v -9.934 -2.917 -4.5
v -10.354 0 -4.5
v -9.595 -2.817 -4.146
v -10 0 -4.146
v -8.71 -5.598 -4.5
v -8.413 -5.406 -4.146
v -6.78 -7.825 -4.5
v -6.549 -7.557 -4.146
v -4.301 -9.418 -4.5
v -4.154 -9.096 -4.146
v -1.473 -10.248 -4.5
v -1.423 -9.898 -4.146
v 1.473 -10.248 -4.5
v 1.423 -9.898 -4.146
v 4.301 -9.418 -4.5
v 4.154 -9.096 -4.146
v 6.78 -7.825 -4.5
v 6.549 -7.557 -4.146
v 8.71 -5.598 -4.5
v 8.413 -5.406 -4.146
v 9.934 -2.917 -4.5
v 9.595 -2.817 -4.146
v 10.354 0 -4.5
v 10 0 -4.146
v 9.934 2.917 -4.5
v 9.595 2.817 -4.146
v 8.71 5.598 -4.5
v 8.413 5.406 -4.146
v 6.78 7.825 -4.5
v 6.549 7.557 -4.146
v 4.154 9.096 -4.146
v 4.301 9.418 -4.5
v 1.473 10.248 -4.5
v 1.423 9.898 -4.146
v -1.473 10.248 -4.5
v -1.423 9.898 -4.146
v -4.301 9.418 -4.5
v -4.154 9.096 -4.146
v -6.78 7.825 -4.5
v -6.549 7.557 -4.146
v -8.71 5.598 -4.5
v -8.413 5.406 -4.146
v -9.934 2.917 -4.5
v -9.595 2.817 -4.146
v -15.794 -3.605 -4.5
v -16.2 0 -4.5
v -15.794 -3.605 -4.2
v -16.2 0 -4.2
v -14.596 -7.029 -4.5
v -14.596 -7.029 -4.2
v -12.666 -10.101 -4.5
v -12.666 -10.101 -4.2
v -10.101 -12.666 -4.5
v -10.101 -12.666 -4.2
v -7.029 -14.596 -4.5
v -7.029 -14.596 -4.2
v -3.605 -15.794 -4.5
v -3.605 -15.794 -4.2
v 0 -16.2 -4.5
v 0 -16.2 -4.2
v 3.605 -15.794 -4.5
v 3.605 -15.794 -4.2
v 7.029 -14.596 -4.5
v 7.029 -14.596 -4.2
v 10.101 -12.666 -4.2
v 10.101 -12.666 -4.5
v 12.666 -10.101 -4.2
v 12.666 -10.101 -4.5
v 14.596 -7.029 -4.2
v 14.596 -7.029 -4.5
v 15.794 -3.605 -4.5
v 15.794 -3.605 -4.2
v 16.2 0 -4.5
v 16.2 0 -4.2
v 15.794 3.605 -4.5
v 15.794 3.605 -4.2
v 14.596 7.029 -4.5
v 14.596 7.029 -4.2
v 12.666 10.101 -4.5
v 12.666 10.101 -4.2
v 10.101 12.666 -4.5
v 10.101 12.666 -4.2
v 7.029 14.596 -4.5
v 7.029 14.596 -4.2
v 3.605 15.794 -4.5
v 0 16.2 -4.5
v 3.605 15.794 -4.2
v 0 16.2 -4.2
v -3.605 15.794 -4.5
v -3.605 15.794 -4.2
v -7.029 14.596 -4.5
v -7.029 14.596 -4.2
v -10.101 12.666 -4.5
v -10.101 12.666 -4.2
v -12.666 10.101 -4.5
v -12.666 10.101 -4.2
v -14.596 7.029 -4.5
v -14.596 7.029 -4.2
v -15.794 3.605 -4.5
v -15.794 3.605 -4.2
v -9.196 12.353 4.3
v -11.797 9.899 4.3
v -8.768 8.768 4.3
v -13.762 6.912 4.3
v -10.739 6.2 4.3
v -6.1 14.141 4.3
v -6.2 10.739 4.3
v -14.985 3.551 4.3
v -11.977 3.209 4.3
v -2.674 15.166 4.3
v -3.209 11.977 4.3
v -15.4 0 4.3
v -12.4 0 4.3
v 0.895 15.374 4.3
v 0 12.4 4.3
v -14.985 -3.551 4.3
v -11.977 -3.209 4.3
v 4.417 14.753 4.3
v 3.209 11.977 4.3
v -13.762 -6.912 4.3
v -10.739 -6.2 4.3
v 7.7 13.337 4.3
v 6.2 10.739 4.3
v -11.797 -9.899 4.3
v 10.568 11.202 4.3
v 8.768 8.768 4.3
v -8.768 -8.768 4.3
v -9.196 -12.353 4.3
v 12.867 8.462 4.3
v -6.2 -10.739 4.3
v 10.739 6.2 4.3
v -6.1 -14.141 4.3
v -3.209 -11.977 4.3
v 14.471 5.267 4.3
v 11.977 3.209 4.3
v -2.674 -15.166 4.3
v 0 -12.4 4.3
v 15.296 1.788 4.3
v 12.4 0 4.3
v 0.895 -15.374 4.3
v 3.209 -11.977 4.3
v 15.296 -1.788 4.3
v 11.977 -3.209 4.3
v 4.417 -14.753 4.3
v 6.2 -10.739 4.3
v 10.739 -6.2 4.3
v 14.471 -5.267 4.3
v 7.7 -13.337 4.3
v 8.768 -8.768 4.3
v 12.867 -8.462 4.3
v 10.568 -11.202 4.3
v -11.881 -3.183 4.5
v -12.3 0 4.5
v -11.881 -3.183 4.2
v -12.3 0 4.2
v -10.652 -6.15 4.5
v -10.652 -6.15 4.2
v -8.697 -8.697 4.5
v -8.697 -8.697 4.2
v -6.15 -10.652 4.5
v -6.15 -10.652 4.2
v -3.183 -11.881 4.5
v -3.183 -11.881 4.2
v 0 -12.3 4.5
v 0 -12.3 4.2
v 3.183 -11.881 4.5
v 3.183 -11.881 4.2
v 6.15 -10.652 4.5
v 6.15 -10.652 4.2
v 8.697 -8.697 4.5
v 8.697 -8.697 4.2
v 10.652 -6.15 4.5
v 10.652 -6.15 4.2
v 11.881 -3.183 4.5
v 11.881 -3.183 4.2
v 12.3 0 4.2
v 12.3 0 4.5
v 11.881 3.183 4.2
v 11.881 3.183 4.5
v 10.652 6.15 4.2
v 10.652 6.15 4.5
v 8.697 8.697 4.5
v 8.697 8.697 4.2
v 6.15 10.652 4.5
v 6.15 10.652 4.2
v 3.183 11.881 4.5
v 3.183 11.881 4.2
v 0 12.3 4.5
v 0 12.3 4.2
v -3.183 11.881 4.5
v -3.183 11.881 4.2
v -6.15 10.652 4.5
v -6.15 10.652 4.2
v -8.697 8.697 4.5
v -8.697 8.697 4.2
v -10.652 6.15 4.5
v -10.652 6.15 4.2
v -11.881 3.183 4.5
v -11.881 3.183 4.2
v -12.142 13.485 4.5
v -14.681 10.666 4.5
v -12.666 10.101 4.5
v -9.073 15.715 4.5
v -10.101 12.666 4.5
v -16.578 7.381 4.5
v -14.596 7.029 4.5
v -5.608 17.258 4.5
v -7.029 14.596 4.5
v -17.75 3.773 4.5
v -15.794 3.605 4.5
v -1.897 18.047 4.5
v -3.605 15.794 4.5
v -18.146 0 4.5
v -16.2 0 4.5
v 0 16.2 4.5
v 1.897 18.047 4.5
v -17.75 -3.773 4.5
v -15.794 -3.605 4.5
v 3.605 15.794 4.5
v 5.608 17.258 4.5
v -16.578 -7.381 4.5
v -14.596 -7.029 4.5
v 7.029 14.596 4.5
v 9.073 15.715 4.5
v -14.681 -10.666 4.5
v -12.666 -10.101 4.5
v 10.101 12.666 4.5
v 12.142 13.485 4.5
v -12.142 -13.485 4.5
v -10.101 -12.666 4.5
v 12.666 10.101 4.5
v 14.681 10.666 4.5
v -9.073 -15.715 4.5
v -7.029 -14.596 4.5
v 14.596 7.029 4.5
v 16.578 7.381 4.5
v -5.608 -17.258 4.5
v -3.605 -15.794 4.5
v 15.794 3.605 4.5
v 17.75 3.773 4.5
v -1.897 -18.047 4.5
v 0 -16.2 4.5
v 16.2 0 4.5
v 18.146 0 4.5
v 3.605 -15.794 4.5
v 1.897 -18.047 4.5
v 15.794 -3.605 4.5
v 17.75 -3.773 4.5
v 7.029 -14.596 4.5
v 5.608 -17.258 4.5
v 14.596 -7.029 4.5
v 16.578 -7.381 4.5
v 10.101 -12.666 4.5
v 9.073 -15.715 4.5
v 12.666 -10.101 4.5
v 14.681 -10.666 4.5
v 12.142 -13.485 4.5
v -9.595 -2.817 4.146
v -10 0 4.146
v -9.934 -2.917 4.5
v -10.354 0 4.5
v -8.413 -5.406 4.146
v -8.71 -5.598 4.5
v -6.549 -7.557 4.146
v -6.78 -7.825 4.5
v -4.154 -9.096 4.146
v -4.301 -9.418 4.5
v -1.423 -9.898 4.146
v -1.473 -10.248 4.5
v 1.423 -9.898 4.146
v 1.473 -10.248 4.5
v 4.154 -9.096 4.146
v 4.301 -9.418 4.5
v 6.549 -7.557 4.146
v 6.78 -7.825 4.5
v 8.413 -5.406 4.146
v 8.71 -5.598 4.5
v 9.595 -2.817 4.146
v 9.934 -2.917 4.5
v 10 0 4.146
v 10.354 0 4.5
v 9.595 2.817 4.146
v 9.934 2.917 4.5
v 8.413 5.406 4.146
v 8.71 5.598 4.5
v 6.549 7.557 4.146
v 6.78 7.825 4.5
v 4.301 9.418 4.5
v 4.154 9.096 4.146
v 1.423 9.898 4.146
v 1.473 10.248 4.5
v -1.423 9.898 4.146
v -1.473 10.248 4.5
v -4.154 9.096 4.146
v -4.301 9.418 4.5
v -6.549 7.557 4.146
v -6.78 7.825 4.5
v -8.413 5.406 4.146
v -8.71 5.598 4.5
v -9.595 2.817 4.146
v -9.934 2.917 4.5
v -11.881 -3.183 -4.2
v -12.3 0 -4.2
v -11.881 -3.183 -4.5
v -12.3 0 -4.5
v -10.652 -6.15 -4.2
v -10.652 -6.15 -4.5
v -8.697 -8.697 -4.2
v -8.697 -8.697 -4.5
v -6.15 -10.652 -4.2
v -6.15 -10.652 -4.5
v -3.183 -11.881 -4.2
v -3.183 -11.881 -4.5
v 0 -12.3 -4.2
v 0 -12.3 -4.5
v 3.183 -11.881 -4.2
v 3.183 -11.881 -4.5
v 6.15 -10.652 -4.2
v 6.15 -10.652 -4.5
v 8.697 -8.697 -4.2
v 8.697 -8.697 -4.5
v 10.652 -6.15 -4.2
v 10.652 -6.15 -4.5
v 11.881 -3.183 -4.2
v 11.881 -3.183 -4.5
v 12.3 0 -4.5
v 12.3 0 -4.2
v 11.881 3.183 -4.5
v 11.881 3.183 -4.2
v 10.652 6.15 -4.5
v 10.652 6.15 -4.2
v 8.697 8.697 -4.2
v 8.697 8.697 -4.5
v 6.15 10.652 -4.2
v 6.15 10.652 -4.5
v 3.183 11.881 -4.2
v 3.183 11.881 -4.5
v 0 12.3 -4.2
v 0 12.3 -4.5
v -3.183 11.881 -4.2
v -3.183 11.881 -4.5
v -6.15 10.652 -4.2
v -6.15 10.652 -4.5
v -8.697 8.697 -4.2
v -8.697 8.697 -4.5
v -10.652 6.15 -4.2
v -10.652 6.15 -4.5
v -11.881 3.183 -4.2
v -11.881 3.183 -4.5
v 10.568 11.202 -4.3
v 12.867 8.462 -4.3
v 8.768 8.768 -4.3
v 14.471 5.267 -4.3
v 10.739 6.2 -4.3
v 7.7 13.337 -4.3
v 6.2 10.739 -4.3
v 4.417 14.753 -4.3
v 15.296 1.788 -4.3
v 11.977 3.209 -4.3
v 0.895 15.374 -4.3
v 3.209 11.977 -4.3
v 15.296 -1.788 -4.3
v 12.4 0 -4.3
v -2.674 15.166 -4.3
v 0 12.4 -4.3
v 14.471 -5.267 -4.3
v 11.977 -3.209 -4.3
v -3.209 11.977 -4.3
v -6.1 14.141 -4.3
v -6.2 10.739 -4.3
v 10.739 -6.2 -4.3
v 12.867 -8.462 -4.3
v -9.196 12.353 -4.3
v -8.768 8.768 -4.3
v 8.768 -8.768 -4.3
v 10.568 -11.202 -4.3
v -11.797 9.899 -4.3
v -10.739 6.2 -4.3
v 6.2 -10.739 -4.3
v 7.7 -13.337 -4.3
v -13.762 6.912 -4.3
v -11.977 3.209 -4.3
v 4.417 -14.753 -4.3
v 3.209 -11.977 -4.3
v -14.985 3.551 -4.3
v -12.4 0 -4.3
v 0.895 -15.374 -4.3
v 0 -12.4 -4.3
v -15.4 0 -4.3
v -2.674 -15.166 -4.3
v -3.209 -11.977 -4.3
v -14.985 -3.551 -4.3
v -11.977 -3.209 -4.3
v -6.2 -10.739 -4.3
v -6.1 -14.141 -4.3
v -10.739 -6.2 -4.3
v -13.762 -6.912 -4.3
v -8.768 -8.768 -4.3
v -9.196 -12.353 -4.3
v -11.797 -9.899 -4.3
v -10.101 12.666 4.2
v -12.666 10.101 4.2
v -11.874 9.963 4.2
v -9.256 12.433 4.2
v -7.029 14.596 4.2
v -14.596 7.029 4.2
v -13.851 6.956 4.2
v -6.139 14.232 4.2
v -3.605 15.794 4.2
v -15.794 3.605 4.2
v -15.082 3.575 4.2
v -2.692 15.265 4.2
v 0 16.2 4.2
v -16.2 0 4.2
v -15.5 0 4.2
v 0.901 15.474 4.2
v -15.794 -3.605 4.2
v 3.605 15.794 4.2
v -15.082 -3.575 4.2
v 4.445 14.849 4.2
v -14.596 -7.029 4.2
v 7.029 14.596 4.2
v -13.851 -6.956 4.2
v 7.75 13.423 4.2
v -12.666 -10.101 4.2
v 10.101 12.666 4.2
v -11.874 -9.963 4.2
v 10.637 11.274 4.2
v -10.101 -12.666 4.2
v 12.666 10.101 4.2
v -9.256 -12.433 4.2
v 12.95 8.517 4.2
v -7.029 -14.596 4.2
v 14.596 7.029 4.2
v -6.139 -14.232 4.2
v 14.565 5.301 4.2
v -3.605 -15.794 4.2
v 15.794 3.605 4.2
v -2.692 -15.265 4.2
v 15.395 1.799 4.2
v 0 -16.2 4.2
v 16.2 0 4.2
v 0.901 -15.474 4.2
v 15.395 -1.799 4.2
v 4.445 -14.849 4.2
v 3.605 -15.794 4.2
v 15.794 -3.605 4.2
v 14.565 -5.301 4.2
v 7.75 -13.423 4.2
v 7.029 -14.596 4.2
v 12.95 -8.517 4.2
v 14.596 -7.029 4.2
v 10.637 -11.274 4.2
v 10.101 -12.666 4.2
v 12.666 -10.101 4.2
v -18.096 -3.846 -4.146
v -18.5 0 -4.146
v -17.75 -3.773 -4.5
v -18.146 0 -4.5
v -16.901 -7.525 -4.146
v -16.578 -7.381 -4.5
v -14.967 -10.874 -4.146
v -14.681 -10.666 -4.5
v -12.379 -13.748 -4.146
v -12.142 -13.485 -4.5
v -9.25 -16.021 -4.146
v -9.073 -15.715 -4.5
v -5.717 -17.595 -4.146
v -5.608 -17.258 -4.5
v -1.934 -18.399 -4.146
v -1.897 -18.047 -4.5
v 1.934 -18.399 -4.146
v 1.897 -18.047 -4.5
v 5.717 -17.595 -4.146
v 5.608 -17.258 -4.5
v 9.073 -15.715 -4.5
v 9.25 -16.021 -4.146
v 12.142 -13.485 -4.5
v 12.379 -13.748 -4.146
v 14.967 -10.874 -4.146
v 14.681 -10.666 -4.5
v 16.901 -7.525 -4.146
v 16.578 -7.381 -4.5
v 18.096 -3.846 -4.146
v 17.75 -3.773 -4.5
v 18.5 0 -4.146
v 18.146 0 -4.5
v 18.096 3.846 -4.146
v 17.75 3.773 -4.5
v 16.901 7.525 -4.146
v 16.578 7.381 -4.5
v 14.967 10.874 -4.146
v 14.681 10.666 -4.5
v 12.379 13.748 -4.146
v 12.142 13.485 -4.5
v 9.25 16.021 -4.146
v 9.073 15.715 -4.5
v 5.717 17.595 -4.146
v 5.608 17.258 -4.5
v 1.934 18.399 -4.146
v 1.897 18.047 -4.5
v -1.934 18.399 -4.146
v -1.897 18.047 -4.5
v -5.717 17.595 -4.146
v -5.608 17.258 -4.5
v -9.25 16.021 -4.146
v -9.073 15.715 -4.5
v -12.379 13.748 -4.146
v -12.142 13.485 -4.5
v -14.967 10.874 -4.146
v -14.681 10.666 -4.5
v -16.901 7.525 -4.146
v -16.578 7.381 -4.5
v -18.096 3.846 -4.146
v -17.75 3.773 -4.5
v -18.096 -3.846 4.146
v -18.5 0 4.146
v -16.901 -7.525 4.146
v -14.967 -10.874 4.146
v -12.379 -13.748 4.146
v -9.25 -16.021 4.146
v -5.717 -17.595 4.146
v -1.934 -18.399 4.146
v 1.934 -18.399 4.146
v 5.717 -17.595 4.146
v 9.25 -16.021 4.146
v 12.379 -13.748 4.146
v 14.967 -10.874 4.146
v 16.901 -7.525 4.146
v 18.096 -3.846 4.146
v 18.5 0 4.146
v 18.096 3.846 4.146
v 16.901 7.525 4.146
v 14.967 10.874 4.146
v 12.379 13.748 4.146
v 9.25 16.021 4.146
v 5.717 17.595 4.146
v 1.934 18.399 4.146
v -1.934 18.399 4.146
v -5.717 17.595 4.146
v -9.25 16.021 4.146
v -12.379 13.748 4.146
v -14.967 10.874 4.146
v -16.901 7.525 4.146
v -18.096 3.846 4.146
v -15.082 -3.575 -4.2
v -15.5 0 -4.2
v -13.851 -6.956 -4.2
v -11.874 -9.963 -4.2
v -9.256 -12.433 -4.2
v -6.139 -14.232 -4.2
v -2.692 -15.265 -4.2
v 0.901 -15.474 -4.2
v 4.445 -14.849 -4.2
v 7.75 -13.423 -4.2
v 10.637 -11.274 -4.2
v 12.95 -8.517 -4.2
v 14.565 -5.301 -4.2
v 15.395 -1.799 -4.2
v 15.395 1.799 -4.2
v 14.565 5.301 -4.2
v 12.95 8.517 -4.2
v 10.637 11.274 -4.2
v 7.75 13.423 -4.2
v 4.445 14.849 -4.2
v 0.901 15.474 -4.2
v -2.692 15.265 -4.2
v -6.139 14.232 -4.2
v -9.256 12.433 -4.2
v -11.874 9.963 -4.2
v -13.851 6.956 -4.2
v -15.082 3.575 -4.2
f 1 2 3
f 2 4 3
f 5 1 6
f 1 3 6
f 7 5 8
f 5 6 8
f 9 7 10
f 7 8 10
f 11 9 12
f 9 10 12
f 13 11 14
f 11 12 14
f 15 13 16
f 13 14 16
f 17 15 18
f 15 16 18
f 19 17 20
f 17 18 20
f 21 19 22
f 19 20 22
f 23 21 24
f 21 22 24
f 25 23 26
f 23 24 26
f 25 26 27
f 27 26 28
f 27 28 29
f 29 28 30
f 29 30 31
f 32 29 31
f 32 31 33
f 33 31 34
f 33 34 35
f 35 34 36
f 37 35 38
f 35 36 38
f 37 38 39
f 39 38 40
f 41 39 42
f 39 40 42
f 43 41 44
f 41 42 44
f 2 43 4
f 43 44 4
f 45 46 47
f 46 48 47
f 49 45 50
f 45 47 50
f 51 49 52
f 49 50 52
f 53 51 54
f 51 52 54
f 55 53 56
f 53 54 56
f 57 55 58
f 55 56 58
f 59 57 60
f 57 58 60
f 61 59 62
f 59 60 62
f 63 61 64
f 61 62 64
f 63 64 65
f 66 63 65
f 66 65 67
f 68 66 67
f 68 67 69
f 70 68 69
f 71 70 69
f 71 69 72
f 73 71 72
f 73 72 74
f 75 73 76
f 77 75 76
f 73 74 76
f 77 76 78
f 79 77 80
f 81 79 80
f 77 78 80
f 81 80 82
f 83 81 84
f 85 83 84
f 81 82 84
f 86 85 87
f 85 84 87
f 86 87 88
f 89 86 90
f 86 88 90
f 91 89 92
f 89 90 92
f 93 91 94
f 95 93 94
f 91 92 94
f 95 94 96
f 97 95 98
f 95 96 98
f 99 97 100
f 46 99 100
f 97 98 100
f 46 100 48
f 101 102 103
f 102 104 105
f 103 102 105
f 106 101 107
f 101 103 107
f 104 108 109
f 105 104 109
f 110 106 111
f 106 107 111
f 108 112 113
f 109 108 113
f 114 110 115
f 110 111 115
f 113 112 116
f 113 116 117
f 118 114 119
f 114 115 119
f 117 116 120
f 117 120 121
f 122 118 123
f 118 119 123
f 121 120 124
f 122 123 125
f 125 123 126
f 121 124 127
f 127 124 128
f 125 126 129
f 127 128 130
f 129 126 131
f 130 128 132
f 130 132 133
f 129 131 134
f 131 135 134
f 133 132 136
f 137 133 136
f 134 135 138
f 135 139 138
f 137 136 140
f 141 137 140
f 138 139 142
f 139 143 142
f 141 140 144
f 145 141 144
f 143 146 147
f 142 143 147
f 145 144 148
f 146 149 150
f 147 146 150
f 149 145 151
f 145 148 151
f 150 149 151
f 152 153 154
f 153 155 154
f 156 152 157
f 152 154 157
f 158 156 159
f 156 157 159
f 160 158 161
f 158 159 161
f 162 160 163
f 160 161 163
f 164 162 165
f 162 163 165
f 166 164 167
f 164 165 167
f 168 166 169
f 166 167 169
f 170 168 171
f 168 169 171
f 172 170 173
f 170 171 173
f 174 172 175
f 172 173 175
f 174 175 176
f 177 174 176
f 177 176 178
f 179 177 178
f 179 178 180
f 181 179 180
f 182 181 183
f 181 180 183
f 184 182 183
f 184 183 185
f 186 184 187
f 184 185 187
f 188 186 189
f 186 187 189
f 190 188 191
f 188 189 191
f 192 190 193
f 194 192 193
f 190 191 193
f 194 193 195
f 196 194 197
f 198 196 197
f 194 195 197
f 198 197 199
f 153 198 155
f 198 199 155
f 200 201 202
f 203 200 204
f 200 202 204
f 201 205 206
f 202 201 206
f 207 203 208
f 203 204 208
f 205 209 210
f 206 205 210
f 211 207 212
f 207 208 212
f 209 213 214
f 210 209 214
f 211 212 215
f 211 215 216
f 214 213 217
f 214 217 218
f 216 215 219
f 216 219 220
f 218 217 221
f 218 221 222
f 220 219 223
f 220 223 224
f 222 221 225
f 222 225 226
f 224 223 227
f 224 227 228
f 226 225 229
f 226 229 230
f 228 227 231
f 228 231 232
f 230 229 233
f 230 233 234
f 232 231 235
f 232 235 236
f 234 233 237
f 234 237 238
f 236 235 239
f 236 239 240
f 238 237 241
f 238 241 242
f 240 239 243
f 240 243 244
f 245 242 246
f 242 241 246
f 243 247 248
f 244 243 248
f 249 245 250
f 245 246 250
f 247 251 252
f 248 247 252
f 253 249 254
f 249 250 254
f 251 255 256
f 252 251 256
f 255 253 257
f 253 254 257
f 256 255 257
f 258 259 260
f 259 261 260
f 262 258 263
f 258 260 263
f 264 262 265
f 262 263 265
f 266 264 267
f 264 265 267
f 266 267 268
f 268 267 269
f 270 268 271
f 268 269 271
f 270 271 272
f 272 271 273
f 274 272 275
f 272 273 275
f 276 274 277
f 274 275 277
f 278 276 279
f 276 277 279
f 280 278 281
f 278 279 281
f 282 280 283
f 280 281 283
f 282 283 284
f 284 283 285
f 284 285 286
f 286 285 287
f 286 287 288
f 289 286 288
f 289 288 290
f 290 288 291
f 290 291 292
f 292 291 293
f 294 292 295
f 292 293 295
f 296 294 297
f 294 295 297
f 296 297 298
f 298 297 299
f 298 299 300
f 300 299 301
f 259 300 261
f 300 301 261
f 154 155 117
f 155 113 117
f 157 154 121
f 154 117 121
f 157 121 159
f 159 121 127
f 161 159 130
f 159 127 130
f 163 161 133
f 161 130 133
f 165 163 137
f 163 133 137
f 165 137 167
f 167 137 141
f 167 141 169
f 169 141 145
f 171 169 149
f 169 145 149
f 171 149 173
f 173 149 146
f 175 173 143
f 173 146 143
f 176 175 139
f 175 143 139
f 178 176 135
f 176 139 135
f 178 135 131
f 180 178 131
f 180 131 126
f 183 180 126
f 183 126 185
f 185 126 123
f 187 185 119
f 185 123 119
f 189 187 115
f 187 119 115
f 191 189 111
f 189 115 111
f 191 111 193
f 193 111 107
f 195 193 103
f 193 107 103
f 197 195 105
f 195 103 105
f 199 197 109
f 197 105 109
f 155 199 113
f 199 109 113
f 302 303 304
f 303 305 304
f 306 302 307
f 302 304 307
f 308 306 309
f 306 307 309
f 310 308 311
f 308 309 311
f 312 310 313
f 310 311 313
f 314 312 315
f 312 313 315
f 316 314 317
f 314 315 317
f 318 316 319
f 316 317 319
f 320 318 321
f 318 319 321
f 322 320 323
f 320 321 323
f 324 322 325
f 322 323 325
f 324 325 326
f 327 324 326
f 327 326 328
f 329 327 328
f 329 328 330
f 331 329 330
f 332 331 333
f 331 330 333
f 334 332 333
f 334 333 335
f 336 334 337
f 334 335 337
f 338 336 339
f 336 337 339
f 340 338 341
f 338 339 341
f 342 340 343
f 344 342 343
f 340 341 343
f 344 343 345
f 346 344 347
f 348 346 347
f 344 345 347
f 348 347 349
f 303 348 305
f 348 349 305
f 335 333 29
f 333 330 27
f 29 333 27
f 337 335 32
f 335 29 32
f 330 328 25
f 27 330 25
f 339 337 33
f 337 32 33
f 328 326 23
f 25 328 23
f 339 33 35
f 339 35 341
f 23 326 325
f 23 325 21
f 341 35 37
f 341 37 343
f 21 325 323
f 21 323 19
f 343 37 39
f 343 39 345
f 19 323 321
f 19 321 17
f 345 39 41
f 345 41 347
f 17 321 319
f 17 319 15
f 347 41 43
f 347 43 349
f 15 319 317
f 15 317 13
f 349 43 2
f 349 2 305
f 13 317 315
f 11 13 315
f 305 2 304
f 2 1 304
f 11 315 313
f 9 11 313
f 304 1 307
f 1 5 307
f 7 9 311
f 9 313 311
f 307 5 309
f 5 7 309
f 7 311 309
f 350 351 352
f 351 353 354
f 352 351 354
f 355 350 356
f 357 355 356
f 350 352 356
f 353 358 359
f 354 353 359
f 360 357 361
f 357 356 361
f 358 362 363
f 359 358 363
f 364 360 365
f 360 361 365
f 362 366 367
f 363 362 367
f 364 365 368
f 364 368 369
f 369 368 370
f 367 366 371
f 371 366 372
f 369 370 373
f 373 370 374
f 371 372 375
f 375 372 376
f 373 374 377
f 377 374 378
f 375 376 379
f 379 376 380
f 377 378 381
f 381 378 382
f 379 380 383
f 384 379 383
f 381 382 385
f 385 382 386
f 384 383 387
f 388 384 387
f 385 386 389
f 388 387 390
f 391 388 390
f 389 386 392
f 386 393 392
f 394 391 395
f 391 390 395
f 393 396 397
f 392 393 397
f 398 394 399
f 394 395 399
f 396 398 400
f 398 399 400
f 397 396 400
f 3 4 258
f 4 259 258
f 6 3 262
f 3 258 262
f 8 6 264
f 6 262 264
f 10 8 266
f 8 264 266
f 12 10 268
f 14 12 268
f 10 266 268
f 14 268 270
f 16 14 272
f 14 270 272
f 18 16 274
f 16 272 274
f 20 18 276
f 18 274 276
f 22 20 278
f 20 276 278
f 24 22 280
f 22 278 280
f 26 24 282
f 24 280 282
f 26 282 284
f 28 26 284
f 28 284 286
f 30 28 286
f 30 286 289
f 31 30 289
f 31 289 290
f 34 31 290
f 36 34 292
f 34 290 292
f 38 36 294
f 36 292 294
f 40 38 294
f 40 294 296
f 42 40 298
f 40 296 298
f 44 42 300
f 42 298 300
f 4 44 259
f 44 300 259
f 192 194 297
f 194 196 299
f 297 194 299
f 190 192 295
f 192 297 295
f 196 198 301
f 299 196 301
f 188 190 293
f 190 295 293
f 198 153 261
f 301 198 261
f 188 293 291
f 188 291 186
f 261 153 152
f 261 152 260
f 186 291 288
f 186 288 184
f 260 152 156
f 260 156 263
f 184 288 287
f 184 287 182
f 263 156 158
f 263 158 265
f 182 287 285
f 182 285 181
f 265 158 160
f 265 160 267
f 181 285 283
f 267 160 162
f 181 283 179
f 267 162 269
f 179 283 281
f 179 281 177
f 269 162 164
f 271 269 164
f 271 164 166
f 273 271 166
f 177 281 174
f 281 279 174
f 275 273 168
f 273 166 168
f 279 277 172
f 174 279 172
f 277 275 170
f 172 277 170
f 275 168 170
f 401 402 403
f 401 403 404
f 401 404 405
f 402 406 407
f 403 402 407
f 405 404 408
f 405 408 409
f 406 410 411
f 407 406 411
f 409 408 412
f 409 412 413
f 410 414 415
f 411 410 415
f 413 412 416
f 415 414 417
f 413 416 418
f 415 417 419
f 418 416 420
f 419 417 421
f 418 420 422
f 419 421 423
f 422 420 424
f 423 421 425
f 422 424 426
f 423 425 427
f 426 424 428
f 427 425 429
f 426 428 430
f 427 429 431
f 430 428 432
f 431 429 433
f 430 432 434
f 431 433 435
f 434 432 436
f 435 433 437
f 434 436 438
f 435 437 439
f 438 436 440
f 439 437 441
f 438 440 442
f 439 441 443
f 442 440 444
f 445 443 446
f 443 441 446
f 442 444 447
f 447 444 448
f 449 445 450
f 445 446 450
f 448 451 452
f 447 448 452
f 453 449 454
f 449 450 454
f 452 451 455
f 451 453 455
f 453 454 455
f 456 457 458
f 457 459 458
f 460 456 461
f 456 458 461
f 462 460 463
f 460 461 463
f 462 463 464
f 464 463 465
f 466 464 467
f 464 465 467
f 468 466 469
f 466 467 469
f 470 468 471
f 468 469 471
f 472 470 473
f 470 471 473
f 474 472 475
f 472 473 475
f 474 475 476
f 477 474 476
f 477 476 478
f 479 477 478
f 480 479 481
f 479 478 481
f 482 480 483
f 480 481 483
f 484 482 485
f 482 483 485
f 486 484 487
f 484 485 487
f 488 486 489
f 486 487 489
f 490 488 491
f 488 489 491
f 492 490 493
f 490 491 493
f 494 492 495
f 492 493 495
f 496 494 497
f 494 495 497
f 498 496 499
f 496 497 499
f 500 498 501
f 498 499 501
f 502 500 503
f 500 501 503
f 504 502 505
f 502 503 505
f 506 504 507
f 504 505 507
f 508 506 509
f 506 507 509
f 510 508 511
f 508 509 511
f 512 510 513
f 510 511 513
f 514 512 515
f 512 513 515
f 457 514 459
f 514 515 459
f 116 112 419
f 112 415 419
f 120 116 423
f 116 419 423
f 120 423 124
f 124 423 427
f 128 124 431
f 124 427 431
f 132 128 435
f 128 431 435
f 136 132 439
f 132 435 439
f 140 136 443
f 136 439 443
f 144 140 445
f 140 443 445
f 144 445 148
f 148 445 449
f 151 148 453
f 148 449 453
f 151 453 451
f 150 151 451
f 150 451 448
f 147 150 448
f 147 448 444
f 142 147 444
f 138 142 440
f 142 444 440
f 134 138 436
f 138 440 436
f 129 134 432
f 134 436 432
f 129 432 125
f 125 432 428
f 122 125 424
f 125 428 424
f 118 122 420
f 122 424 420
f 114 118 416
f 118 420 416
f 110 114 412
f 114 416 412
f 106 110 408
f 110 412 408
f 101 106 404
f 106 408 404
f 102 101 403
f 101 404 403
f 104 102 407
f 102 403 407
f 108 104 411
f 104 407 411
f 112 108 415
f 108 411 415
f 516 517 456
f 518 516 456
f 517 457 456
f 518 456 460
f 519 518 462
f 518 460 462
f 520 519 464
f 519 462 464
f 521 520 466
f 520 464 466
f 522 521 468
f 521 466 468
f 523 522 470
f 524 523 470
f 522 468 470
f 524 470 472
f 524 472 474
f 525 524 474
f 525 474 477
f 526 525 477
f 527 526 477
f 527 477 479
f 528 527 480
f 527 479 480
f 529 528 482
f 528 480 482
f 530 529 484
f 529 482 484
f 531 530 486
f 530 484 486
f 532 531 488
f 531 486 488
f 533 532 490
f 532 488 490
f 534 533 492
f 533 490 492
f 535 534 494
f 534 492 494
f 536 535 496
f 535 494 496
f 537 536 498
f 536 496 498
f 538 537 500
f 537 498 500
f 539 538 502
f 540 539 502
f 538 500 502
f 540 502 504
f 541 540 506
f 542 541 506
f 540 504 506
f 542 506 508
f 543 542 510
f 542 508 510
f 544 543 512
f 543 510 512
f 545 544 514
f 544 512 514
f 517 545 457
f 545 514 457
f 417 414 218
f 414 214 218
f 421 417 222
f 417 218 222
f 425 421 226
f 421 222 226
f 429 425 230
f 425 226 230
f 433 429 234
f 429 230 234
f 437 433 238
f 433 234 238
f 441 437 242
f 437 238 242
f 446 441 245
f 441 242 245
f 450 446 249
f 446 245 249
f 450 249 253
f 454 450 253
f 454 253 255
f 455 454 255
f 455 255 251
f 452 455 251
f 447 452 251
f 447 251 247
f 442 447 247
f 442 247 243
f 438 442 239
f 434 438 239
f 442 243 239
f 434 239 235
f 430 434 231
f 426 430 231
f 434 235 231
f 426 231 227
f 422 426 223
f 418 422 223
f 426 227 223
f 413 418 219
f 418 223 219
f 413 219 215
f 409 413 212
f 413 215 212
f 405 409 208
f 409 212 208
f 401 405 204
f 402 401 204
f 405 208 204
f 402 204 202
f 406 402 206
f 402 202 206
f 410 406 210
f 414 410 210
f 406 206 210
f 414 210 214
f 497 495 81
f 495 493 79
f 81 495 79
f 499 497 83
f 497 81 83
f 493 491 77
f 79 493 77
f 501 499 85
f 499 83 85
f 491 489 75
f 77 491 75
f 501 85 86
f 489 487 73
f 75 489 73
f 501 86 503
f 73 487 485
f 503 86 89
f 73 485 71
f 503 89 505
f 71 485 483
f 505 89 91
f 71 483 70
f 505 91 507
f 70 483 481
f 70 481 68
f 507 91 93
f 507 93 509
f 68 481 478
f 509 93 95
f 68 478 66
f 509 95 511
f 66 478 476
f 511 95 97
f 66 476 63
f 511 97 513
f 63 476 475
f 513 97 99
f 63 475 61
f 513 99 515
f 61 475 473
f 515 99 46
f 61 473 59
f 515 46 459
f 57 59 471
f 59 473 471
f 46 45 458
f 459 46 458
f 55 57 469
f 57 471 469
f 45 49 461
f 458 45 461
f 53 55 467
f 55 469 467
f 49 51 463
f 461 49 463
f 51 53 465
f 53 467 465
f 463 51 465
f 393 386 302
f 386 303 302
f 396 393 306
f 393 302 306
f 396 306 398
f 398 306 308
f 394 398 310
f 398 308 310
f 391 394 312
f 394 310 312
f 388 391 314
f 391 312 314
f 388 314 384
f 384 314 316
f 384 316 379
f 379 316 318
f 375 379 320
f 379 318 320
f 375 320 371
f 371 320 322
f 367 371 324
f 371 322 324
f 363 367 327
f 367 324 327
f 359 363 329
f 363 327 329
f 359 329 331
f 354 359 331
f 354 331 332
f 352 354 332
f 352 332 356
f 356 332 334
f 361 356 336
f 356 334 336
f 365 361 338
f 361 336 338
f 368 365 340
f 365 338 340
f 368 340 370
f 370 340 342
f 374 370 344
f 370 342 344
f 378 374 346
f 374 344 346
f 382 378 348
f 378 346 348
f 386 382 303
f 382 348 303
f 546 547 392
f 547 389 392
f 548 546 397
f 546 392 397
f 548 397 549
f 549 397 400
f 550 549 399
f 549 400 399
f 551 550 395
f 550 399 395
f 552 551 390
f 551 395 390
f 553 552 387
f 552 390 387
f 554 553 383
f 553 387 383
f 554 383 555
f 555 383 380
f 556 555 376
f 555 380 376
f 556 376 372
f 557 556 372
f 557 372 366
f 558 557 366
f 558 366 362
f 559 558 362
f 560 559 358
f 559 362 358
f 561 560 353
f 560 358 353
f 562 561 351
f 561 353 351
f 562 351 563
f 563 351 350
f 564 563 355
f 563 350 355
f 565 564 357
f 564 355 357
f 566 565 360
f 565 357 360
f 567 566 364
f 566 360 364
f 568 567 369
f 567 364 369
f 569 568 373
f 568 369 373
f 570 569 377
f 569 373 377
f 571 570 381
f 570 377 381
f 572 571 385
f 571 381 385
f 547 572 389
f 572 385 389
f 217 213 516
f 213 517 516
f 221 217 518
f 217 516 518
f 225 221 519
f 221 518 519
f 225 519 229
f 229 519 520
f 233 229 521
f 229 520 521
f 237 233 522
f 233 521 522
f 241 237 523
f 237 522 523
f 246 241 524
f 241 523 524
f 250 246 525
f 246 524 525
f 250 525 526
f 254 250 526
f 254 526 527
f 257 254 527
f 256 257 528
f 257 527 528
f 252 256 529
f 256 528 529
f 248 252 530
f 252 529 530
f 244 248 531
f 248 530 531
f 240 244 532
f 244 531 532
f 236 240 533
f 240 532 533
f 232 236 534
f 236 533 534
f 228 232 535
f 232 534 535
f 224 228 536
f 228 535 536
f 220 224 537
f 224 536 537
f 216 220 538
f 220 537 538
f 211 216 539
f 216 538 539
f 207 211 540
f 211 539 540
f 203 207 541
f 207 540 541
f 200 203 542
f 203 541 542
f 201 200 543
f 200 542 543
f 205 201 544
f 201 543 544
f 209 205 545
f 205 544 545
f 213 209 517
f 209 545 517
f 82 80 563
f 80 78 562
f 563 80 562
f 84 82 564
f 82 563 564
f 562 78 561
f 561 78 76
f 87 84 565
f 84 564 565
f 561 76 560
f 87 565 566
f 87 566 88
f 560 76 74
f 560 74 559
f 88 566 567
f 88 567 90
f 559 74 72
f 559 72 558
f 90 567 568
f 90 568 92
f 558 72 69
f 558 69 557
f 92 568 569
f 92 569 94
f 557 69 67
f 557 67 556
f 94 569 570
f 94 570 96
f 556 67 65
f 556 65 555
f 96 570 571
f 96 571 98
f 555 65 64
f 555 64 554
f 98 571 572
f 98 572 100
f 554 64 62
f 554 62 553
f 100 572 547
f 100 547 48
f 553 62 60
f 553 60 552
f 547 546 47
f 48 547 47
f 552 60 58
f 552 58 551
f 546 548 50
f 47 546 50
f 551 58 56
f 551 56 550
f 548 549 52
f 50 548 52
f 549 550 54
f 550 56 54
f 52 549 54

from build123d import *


with BuildPart() as part:
    # Sketch → Revolution (revolve)
    with BuildSketch(Plane.XZ):
        Polygon((-18.5, 4.146447), (-18.5, -4.146447), (-18.146447, -4.5), (-16.2, -4.5), (-16.2, -4.2), (-15.5, -4.2), (-15.4, -4.3), (-12.4, -4.3), (-12.3, -4.2), (-12.3, -4.5), (-10.353553, -4.5), (-10, -4.146447), (-10, 4.146447), (-10.353553, 4.5), (-12.3, 4.5), (-12.3, 4.2), (-12.4, 4.3), (-15.4, 4.3), (-15.5, 4.2), (-16.2, 4.2), (-16.2, 4.5), (-18.146447, 4.5), align=None)
    revolve(axis=Axis((0, 0, 0), (0, 0, 1)))


solid = part.part
